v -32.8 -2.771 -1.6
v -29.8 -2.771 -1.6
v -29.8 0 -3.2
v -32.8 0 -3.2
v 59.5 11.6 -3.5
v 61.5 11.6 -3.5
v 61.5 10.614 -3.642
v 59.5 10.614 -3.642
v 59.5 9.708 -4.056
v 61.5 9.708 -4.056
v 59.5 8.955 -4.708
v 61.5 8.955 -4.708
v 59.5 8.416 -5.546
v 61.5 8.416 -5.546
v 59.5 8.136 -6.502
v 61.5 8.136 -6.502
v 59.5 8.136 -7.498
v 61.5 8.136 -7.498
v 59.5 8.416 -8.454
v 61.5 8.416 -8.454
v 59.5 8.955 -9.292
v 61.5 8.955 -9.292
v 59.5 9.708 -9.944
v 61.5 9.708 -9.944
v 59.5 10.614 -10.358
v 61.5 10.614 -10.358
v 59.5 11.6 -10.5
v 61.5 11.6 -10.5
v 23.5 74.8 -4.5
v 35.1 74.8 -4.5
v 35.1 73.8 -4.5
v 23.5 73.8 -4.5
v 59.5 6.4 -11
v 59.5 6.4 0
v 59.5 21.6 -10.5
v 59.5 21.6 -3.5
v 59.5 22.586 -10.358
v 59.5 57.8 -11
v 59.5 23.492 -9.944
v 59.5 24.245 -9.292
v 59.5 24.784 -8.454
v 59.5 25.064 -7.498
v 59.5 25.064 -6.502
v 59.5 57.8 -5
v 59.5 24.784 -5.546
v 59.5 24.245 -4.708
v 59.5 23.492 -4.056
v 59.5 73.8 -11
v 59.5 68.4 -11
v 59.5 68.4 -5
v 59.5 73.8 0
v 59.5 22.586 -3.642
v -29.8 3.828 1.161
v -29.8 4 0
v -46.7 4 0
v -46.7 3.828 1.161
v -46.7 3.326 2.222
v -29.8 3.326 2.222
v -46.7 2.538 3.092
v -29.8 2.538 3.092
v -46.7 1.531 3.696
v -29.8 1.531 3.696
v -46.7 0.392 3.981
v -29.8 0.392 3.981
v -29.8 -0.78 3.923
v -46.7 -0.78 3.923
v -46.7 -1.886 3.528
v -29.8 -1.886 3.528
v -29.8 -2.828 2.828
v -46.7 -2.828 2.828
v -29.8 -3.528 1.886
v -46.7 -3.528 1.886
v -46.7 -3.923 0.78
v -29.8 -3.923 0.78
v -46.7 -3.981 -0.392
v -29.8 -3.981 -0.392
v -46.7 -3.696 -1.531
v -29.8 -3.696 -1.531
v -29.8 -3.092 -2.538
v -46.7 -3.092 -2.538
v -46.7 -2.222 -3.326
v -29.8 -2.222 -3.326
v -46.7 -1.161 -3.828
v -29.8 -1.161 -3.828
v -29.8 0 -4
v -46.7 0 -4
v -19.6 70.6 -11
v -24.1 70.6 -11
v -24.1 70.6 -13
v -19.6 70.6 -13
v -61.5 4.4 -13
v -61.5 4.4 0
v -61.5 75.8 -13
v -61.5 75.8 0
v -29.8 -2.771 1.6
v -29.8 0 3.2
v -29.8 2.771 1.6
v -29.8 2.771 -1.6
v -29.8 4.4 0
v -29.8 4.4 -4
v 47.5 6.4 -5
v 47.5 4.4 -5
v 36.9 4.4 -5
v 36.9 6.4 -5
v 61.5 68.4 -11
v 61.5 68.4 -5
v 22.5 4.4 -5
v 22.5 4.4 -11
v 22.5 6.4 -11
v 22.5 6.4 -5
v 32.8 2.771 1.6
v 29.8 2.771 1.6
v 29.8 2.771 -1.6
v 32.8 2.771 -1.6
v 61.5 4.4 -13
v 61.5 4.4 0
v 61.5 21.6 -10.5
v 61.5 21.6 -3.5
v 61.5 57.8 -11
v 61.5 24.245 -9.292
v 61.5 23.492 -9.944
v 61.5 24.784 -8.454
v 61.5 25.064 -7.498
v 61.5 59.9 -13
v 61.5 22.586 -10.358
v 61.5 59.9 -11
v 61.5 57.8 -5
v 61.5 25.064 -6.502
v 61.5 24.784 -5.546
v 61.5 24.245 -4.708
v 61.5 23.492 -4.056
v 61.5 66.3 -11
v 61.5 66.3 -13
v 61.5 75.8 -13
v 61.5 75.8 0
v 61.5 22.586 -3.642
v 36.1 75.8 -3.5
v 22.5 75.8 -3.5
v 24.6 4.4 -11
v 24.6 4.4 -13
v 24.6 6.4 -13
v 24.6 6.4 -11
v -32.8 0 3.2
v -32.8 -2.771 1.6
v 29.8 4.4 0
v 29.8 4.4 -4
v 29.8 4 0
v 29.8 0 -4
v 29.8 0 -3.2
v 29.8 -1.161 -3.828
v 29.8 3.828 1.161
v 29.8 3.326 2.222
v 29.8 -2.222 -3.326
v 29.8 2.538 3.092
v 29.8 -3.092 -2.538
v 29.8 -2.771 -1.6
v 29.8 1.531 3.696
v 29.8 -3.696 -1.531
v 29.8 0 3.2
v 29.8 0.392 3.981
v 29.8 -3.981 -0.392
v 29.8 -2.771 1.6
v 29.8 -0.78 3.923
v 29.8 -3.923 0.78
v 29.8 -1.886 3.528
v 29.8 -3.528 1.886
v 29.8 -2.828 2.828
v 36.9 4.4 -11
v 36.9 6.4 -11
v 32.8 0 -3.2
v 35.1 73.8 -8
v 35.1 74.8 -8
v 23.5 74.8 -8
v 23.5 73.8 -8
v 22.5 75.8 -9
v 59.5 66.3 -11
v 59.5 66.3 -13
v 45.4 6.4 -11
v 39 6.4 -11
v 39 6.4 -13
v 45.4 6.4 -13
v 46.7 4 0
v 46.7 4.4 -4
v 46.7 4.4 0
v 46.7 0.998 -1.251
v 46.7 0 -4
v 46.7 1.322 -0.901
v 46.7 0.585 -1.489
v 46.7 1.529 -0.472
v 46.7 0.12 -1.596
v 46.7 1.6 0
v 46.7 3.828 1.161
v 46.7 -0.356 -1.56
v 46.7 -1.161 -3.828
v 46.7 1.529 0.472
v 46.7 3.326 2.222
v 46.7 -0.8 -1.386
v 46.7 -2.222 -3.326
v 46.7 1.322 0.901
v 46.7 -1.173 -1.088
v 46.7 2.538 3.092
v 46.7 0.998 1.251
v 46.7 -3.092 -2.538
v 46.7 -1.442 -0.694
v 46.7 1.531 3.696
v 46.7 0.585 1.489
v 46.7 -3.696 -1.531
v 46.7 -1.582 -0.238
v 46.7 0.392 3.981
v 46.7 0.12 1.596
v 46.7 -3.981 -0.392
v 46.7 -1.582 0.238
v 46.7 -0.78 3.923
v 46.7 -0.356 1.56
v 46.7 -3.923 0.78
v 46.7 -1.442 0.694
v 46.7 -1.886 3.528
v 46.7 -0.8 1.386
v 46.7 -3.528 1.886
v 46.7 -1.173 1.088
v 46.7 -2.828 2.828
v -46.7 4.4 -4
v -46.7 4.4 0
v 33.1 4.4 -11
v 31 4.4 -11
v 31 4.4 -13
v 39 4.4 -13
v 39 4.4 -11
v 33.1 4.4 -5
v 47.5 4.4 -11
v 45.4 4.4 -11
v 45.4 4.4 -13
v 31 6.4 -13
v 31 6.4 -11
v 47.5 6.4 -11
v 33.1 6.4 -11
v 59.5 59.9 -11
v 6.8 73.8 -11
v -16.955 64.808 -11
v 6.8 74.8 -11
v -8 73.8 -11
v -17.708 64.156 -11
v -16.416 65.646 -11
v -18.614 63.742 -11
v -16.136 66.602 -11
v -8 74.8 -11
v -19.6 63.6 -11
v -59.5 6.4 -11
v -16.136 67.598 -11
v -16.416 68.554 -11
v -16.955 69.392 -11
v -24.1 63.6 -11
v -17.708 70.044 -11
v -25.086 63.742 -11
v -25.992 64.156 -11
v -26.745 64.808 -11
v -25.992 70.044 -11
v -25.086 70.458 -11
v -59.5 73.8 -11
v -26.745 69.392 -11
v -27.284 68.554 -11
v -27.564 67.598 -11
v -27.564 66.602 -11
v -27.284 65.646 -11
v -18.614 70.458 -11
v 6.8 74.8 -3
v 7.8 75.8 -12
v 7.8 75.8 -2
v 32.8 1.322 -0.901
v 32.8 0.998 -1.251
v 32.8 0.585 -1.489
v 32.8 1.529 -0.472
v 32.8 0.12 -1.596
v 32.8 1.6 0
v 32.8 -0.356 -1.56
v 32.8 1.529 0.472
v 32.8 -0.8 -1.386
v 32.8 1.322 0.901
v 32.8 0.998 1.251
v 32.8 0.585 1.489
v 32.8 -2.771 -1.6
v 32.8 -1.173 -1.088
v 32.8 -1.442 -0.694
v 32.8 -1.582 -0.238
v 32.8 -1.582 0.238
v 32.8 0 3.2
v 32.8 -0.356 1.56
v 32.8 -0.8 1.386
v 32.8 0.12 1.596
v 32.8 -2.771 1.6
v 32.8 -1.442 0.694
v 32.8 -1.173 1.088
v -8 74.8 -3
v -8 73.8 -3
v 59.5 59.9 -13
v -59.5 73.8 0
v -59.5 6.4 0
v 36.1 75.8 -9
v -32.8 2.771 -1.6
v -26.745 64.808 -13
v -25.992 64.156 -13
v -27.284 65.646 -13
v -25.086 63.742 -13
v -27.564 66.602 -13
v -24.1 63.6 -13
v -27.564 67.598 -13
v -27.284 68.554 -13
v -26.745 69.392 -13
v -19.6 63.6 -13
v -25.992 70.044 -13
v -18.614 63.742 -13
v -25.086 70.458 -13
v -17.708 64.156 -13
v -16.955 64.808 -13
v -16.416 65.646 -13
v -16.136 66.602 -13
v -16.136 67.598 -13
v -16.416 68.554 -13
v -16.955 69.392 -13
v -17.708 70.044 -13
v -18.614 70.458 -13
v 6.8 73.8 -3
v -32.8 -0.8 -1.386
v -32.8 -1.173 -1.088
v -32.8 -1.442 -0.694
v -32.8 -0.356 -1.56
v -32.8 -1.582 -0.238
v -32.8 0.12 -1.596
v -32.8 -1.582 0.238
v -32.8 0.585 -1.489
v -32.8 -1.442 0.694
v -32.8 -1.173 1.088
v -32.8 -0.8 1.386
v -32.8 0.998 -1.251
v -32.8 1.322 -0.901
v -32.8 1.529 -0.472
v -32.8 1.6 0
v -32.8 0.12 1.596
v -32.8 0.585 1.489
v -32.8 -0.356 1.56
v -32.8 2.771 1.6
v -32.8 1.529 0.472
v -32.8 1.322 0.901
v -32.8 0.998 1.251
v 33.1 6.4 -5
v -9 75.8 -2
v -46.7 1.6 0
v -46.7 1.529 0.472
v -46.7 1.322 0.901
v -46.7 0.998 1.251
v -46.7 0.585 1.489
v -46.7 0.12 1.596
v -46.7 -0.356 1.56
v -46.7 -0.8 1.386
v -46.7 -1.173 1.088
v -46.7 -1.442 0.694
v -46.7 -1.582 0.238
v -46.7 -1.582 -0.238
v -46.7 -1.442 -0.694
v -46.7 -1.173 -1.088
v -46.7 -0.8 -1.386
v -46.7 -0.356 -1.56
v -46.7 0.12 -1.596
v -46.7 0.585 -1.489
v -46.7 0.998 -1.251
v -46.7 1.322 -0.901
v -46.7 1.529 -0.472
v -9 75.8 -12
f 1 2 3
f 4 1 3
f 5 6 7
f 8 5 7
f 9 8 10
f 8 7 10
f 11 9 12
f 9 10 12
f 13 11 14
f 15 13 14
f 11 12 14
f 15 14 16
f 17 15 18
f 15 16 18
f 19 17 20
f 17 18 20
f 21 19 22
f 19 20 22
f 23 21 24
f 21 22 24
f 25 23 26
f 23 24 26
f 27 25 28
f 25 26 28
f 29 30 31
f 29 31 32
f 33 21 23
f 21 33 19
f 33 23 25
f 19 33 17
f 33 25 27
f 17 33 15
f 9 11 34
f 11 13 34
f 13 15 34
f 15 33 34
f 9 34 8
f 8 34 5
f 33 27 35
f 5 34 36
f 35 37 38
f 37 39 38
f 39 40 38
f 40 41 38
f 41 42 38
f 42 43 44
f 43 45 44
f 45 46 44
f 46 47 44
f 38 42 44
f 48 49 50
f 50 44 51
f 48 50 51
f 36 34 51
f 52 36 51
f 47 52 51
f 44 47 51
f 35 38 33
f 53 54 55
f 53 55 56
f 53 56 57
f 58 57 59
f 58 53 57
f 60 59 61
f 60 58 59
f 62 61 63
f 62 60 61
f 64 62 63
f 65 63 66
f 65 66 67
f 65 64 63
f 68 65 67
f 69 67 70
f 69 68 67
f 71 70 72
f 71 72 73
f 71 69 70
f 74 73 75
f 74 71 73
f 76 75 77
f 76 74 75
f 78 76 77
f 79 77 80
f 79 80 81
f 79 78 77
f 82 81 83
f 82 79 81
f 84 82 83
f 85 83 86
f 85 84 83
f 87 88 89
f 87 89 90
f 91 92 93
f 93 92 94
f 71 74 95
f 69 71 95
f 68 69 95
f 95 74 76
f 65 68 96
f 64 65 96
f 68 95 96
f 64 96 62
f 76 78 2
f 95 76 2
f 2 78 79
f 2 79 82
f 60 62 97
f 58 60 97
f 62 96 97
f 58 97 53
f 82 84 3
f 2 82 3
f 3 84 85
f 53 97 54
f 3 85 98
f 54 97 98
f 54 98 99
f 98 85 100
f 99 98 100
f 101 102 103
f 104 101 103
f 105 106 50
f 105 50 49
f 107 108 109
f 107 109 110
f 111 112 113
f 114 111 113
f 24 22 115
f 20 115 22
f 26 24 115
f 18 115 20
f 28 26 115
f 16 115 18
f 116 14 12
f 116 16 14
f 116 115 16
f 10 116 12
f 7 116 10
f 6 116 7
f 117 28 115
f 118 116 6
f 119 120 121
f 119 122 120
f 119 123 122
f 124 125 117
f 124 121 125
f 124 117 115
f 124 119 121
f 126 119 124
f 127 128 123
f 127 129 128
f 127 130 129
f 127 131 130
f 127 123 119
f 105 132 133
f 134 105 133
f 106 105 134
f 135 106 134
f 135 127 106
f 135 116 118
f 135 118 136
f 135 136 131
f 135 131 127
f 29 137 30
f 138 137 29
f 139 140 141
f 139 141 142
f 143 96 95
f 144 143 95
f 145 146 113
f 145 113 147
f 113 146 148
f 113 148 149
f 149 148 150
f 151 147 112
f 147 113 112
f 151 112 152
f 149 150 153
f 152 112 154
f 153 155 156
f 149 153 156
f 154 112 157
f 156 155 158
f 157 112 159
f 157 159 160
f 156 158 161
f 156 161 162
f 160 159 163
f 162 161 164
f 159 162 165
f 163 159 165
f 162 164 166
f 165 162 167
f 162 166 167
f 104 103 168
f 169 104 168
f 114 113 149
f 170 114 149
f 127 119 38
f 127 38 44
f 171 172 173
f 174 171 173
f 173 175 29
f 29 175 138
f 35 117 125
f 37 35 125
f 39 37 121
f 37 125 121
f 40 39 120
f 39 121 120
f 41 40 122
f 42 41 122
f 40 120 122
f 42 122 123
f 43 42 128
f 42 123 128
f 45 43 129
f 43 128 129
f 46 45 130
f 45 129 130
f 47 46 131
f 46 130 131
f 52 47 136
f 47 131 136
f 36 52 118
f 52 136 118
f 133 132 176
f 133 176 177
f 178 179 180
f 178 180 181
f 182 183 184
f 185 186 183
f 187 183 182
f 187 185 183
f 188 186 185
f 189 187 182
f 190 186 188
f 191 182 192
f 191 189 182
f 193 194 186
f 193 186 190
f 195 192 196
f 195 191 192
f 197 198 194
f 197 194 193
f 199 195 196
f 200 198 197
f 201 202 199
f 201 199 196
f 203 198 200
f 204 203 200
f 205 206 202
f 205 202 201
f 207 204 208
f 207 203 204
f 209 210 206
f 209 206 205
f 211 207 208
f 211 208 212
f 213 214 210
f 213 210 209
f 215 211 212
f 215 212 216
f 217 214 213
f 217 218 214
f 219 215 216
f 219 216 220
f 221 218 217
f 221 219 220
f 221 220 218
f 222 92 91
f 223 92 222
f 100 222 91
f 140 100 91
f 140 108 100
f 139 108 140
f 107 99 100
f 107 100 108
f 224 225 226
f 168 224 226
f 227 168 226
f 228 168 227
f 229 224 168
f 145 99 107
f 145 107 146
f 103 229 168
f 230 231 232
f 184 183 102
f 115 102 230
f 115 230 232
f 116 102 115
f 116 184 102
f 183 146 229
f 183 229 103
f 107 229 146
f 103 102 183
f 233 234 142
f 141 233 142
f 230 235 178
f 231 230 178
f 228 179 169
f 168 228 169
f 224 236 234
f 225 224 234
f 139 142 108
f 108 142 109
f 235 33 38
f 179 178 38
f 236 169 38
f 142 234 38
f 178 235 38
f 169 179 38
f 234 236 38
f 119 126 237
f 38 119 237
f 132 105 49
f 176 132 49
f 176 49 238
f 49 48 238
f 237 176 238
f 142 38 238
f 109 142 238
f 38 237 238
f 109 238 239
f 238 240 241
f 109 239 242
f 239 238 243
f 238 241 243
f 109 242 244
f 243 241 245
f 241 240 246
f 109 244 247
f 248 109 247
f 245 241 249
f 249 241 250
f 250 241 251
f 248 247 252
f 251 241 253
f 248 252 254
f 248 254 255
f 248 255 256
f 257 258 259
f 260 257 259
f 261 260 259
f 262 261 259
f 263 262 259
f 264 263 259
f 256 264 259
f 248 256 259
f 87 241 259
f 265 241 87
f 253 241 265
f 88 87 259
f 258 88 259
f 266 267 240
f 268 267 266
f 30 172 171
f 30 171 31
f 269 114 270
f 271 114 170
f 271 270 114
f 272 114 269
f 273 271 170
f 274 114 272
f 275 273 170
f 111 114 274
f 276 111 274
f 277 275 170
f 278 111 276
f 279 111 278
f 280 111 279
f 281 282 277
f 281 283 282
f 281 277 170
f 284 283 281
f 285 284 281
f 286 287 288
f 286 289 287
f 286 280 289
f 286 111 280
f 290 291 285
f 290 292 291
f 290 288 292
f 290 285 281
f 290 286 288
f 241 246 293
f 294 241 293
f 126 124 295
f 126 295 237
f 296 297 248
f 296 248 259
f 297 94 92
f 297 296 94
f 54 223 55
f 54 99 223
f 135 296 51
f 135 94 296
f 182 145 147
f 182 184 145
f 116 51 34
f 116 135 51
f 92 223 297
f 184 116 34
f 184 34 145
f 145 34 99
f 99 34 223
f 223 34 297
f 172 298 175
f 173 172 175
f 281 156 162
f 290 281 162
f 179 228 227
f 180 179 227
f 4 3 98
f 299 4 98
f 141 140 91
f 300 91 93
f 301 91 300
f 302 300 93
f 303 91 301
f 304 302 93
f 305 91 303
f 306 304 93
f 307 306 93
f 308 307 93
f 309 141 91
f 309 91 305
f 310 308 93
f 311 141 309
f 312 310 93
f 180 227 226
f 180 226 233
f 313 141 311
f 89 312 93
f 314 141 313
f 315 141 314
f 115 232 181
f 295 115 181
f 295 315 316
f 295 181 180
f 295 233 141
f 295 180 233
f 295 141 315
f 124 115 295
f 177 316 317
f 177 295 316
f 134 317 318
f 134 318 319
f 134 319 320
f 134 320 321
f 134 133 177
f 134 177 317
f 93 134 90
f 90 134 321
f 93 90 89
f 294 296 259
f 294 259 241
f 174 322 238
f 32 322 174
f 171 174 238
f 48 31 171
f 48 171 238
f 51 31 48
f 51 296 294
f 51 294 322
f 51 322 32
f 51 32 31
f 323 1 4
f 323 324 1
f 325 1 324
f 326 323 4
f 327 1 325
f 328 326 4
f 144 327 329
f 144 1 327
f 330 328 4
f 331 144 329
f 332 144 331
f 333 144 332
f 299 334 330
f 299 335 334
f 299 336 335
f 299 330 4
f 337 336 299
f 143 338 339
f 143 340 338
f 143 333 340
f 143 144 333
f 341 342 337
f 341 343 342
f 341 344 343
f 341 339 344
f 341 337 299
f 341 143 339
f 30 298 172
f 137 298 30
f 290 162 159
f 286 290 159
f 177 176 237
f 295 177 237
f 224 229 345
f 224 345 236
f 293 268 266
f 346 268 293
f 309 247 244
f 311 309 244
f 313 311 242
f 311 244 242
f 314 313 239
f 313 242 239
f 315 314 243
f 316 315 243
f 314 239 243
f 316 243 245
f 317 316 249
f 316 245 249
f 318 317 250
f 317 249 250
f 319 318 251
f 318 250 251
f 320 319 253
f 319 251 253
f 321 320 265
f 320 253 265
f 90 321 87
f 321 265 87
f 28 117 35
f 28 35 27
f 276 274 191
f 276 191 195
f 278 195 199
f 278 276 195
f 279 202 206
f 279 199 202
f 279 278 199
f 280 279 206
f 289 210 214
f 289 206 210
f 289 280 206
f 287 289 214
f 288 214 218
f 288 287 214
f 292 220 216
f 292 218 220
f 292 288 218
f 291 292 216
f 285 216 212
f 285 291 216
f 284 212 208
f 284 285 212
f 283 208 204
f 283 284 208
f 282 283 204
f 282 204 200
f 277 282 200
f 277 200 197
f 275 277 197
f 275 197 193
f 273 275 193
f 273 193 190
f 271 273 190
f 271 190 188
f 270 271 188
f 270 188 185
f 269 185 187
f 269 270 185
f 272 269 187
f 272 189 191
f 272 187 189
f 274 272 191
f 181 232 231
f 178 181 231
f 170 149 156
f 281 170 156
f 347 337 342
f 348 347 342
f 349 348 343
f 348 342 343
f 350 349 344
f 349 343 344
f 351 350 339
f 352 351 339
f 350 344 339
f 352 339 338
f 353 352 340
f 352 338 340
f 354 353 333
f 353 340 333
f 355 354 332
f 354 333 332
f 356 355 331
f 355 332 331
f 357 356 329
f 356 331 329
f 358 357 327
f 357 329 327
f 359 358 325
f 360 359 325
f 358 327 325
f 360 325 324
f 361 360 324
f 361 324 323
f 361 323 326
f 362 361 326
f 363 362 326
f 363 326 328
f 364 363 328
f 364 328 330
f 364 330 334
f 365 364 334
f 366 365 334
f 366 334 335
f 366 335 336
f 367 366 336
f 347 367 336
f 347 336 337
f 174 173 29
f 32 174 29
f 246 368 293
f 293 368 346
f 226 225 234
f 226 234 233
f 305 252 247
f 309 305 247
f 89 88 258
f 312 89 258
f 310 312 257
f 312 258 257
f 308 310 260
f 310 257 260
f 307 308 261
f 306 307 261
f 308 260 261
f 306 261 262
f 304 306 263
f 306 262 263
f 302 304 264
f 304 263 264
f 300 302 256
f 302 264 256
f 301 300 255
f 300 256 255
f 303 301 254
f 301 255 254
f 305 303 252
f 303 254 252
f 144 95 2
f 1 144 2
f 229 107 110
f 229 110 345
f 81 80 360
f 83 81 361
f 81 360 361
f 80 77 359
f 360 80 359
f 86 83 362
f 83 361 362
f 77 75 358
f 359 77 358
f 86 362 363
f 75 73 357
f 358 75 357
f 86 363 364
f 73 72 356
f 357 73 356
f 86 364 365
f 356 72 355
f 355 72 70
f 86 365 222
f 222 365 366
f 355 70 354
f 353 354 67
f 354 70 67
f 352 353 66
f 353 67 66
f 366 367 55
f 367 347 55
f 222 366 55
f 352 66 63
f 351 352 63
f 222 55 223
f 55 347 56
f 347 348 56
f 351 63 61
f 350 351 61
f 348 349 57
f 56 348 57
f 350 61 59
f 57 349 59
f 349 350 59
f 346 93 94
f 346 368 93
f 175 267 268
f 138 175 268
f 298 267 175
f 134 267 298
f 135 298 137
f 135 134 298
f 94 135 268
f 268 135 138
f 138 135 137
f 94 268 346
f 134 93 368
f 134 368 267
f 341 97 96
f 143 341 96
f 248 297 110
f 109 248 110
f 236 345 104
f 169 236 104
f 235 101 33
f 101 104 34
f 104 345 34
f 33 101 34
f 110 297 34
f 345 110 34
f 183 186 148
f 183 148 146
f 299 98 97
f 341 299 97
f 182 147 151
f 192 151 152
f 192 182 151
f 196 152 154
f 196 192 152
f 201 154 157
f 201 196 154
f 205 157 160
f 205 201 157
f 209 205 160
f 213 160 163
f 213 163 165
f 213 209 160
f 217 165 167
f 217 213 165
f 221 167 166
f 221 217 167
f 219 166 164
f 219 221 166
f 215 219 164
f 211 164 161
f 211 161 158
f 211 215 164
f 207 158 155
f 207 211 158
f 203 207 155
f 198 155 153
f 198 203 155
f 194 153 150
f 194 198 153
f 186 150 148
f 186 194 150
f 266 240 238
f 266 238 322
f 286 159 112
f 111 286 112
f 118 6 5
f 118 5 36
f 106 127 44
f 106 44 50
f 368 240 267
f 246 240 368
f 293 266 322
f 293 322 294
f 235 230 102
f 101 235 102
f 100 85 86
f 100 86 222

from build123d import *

# Parameters (mm, degrees)
SKETCH035_R          = 1.6
PAD_DEPTH            = 61.5
PAD_DEPTH_BACK       = 61.5
SKETCH038_W          = 14.8
SKETCH038_H          = 8
SKETCH038_W_2        = 59.6
POCKET001_DEPTH      = 4
POCKET001_DEPTH_BACK = 4
SKETCH039_W          = 119
SKETCH039_H          = 67.4
POCKET002_DEPTH      = 11
POCKET003_DEPTH      = 13.001
SKETCH041_W          = 11.6
SKETCH041_H          = 3.5
SKETCH041_W_2        = 14.8
SKETCH041_H_2        = 8
POCKET004_DEPTH      = 2
POCKET005_DEPTH      = 2
POCKET006_DEPTH      = 2
POCKET011_DEPTH      = 3
POCKET012_DEPTH      = 3
SKETCH051_W          = 14.8
SKETCH051_H          = 4
SKETCH051_W_2        = 59.6
POCKET013_DEPTH      = 0.4
CHAMFER_SIZE         = 1


with BuildPart() as part:
    # Sketch035 (on Face1 of Binder) → Pad (new body, two sides)
    with BuildSketch(Plane.YZ) as pad_sk:
        with BuildLine():
            ThreePointArc((4, 0), (-2.828418, 2.828436), (-2.6e-05, -4))
            Line((-2.6e-05, -4), (4.4, -4))
            Line((4.4, -4), (4.4, -13))
            Line((4.4, -13), (75.8, -13))
            Line((75.8, -13), (75.8, 0))
            Line((75.8, 0), (4, 0))
        make_face()
        Circle(SKETCH035_R, mode=Mode.SUBTRACT)
    extrude(amount=PAD_DEPTH)
    extrude(pad_sk.sketch, amount=-PAD_DEPTH_BACK)

    # Sketch038 → Pocket001 (cut, two sides)
    with BuildSketch(Plane.XY) as pocket001_sk:
        with Locations((-54.1, 0)):
            Rectangle(SKETCH038_W, SKETCH038_H)
        Rectangle(SKETCH038_W_2, SKETCH038_H)
        with Locations((54.1, 0)):
            Rectangle(SKETCH038_W, SKETCH038_H)
    extrude(amount=-POCKET001_DEPTH, mode=Mode.SUBTRACT)
    extrude(pocket001_sk.sketch, amount=POCKET001_DEPTH_BACK, mode=Mode.SUBTRACT)

    # Sketch039 → Pocket002 (cut)
    with BuildSketch(Plane.XY):
        with Locations((0, 40.1)):
            Rectangle(SKETCH039_W, SKETCH039_H)
    extrude(amount=-POCKET002_DEPTH, mode=Mode.SUBTRACT)

    # Sketch040 → Pocket003 (cut, through all)
    with BuildSketch(Plane.XY):
        with BuildLine():
            ThreePointArc((-24.1, 70.6), (-27.6, 67.1), (-24.1, 63.6))
            Line((-24.1, 63.6), (-19.6, 63.6))
            ThreePointArc((-19.6, 63.6), (-16.1, 67.1), (-19.6, 70.6))
            Line((-24.1, 70.6), (-19.6, 70.6))
        make_face()
    extrude(amount=-POCKET003_DEPTH, mode=Mode.SUBTRACT)

    # Sketch041 (on Face16 of Pocket003) → Pocket004 (cut)
    with BuildSketch(Plane(origin=(0, 75.8, 0), x_dir=(-1, 0, 0), z_dir=(0, 1, 0))):
        with Locations((-29.3, -6.25)):
            Rectangle(SKETCH041_W, SKETCH041_H)
        with Locations((0.6, -7)):
            Rectangle(SKETCH041_W_2, SKETCH041_H_2)
    extrude(amount=-POCKET004_DEPTH, mode=Mode.SUBTRACT)

    # Sketch042 (on Face9 of Pocket004) → Pocket005 (cut)
    with BuildSketch(Plane.XZ.offset(-4.4)):
        Polygon((22.5, -5), (33.1, -5), (33.1, -11), (31, -11), (31, -13), (24.6, -13), (24.6, -11), (22.5, -11), align=None)
        Polygon((36.9, -5), (36.9, -11), (39, -11), (39, -13), (45.4, -13), (45.4, -11), (47.5, -11), (47.5, -5), align=None)
    extrude(amount=-POCKET005_DEPTH, mode=Mode.SUBTRACT)

    # Sketch043 (on Face10 of Pocket005) → Pocket006 (cut)
    with BuildSketch(Plane.YZ.offset(61.5)):
        Polygon((57.8, -5), (68.4, -5), (68.4, -11), (66.3, -11), (66.3, -13), (59.9, -13), (59.9, -11), (57.8, -11), align=None)
        with BuildLine():
            Line((11.6, -3.5), (21.6, -3.5))
            ThreePointArc((21.6, -10.5), (25.1, -7), (21.6, -3.5))
            Line((21.6, -10.5), (11.6, -10.5))
            ThreePointArc((11.6, -3.5), (8.1, -7), (11.6, -10.5))
        make_face()
    extrude(amount=-POCKET006_DEPTH, mode=Mode.SUBTRACT)

    # Sketch049 (on Face14 of Pocket006) → Pocket011 (cut)
    with BuildSketch(Plane(origin=(29.8, 0, 0), x_dir=(0, -1, 0), z_dir=(-1, 0, 0))):
        Polygon((2.771281, 1.6), (0, 3.2), (-2.771281, 1.6), (-2.771281, -1.6), (0, -3.2), (2.771281, -1.6), align=None)
    extrude(amount=-POCKET011_DEPTH, mode=Mode.SUBTRACT)

    # Sketch050 (on Face4 of Pocket011) → Pocket012 (cut)
    with BuildSketch(Plane.YZ.offset(-29.8)):
        Polygon((2.771281, -1.6), (2.771281, 1.6), (0, 3.2), (-2.771281, 1.6), (-2.771281, -1.6), (0, -3.2), align=None)
    extrude(amount=-POCKET012_DEPTH, mode=Mode.SUBTRACT)

    # Sketch051 (on Face15 of Pocket012) → Pocket013 (cut)
    with BuildSketch(Plane.XZ.offset(-4)):
        with Locations((54.1, -2)):
            Rectangle(SKETCH051_W, SKETCH051_H)
        with Locations((0, -2)):
            Rectangle(SKETCH051_W_2, SKETCH051_H)
        with Locations((-54.1, -2)):
            Rectangle(SKETCH051_W, SKETCH051_H)
    extrude(amount=-POCKET013_DEPTH, mode=Mode.SUBTRACT)

    # Chamfer
    chamfer_edges = [part.edges().sort_by_distance(p)[0] for p in [
        (35.1, 75.8, -6.25),
        (29.3, 75.8, -4.5),
        (23.5, 75.8, -6.25),
        (29.3, 75.8, -8),
        (6.8, 75.8, -7),
        (-8, 75.8, -7),
        (-0.6, 75.8, -3),
        (-0.6, 75.8, -11),
    ]]
    chamfer(chamfer_edges, length=CHAMFER_SIZE)


solid = part.part
